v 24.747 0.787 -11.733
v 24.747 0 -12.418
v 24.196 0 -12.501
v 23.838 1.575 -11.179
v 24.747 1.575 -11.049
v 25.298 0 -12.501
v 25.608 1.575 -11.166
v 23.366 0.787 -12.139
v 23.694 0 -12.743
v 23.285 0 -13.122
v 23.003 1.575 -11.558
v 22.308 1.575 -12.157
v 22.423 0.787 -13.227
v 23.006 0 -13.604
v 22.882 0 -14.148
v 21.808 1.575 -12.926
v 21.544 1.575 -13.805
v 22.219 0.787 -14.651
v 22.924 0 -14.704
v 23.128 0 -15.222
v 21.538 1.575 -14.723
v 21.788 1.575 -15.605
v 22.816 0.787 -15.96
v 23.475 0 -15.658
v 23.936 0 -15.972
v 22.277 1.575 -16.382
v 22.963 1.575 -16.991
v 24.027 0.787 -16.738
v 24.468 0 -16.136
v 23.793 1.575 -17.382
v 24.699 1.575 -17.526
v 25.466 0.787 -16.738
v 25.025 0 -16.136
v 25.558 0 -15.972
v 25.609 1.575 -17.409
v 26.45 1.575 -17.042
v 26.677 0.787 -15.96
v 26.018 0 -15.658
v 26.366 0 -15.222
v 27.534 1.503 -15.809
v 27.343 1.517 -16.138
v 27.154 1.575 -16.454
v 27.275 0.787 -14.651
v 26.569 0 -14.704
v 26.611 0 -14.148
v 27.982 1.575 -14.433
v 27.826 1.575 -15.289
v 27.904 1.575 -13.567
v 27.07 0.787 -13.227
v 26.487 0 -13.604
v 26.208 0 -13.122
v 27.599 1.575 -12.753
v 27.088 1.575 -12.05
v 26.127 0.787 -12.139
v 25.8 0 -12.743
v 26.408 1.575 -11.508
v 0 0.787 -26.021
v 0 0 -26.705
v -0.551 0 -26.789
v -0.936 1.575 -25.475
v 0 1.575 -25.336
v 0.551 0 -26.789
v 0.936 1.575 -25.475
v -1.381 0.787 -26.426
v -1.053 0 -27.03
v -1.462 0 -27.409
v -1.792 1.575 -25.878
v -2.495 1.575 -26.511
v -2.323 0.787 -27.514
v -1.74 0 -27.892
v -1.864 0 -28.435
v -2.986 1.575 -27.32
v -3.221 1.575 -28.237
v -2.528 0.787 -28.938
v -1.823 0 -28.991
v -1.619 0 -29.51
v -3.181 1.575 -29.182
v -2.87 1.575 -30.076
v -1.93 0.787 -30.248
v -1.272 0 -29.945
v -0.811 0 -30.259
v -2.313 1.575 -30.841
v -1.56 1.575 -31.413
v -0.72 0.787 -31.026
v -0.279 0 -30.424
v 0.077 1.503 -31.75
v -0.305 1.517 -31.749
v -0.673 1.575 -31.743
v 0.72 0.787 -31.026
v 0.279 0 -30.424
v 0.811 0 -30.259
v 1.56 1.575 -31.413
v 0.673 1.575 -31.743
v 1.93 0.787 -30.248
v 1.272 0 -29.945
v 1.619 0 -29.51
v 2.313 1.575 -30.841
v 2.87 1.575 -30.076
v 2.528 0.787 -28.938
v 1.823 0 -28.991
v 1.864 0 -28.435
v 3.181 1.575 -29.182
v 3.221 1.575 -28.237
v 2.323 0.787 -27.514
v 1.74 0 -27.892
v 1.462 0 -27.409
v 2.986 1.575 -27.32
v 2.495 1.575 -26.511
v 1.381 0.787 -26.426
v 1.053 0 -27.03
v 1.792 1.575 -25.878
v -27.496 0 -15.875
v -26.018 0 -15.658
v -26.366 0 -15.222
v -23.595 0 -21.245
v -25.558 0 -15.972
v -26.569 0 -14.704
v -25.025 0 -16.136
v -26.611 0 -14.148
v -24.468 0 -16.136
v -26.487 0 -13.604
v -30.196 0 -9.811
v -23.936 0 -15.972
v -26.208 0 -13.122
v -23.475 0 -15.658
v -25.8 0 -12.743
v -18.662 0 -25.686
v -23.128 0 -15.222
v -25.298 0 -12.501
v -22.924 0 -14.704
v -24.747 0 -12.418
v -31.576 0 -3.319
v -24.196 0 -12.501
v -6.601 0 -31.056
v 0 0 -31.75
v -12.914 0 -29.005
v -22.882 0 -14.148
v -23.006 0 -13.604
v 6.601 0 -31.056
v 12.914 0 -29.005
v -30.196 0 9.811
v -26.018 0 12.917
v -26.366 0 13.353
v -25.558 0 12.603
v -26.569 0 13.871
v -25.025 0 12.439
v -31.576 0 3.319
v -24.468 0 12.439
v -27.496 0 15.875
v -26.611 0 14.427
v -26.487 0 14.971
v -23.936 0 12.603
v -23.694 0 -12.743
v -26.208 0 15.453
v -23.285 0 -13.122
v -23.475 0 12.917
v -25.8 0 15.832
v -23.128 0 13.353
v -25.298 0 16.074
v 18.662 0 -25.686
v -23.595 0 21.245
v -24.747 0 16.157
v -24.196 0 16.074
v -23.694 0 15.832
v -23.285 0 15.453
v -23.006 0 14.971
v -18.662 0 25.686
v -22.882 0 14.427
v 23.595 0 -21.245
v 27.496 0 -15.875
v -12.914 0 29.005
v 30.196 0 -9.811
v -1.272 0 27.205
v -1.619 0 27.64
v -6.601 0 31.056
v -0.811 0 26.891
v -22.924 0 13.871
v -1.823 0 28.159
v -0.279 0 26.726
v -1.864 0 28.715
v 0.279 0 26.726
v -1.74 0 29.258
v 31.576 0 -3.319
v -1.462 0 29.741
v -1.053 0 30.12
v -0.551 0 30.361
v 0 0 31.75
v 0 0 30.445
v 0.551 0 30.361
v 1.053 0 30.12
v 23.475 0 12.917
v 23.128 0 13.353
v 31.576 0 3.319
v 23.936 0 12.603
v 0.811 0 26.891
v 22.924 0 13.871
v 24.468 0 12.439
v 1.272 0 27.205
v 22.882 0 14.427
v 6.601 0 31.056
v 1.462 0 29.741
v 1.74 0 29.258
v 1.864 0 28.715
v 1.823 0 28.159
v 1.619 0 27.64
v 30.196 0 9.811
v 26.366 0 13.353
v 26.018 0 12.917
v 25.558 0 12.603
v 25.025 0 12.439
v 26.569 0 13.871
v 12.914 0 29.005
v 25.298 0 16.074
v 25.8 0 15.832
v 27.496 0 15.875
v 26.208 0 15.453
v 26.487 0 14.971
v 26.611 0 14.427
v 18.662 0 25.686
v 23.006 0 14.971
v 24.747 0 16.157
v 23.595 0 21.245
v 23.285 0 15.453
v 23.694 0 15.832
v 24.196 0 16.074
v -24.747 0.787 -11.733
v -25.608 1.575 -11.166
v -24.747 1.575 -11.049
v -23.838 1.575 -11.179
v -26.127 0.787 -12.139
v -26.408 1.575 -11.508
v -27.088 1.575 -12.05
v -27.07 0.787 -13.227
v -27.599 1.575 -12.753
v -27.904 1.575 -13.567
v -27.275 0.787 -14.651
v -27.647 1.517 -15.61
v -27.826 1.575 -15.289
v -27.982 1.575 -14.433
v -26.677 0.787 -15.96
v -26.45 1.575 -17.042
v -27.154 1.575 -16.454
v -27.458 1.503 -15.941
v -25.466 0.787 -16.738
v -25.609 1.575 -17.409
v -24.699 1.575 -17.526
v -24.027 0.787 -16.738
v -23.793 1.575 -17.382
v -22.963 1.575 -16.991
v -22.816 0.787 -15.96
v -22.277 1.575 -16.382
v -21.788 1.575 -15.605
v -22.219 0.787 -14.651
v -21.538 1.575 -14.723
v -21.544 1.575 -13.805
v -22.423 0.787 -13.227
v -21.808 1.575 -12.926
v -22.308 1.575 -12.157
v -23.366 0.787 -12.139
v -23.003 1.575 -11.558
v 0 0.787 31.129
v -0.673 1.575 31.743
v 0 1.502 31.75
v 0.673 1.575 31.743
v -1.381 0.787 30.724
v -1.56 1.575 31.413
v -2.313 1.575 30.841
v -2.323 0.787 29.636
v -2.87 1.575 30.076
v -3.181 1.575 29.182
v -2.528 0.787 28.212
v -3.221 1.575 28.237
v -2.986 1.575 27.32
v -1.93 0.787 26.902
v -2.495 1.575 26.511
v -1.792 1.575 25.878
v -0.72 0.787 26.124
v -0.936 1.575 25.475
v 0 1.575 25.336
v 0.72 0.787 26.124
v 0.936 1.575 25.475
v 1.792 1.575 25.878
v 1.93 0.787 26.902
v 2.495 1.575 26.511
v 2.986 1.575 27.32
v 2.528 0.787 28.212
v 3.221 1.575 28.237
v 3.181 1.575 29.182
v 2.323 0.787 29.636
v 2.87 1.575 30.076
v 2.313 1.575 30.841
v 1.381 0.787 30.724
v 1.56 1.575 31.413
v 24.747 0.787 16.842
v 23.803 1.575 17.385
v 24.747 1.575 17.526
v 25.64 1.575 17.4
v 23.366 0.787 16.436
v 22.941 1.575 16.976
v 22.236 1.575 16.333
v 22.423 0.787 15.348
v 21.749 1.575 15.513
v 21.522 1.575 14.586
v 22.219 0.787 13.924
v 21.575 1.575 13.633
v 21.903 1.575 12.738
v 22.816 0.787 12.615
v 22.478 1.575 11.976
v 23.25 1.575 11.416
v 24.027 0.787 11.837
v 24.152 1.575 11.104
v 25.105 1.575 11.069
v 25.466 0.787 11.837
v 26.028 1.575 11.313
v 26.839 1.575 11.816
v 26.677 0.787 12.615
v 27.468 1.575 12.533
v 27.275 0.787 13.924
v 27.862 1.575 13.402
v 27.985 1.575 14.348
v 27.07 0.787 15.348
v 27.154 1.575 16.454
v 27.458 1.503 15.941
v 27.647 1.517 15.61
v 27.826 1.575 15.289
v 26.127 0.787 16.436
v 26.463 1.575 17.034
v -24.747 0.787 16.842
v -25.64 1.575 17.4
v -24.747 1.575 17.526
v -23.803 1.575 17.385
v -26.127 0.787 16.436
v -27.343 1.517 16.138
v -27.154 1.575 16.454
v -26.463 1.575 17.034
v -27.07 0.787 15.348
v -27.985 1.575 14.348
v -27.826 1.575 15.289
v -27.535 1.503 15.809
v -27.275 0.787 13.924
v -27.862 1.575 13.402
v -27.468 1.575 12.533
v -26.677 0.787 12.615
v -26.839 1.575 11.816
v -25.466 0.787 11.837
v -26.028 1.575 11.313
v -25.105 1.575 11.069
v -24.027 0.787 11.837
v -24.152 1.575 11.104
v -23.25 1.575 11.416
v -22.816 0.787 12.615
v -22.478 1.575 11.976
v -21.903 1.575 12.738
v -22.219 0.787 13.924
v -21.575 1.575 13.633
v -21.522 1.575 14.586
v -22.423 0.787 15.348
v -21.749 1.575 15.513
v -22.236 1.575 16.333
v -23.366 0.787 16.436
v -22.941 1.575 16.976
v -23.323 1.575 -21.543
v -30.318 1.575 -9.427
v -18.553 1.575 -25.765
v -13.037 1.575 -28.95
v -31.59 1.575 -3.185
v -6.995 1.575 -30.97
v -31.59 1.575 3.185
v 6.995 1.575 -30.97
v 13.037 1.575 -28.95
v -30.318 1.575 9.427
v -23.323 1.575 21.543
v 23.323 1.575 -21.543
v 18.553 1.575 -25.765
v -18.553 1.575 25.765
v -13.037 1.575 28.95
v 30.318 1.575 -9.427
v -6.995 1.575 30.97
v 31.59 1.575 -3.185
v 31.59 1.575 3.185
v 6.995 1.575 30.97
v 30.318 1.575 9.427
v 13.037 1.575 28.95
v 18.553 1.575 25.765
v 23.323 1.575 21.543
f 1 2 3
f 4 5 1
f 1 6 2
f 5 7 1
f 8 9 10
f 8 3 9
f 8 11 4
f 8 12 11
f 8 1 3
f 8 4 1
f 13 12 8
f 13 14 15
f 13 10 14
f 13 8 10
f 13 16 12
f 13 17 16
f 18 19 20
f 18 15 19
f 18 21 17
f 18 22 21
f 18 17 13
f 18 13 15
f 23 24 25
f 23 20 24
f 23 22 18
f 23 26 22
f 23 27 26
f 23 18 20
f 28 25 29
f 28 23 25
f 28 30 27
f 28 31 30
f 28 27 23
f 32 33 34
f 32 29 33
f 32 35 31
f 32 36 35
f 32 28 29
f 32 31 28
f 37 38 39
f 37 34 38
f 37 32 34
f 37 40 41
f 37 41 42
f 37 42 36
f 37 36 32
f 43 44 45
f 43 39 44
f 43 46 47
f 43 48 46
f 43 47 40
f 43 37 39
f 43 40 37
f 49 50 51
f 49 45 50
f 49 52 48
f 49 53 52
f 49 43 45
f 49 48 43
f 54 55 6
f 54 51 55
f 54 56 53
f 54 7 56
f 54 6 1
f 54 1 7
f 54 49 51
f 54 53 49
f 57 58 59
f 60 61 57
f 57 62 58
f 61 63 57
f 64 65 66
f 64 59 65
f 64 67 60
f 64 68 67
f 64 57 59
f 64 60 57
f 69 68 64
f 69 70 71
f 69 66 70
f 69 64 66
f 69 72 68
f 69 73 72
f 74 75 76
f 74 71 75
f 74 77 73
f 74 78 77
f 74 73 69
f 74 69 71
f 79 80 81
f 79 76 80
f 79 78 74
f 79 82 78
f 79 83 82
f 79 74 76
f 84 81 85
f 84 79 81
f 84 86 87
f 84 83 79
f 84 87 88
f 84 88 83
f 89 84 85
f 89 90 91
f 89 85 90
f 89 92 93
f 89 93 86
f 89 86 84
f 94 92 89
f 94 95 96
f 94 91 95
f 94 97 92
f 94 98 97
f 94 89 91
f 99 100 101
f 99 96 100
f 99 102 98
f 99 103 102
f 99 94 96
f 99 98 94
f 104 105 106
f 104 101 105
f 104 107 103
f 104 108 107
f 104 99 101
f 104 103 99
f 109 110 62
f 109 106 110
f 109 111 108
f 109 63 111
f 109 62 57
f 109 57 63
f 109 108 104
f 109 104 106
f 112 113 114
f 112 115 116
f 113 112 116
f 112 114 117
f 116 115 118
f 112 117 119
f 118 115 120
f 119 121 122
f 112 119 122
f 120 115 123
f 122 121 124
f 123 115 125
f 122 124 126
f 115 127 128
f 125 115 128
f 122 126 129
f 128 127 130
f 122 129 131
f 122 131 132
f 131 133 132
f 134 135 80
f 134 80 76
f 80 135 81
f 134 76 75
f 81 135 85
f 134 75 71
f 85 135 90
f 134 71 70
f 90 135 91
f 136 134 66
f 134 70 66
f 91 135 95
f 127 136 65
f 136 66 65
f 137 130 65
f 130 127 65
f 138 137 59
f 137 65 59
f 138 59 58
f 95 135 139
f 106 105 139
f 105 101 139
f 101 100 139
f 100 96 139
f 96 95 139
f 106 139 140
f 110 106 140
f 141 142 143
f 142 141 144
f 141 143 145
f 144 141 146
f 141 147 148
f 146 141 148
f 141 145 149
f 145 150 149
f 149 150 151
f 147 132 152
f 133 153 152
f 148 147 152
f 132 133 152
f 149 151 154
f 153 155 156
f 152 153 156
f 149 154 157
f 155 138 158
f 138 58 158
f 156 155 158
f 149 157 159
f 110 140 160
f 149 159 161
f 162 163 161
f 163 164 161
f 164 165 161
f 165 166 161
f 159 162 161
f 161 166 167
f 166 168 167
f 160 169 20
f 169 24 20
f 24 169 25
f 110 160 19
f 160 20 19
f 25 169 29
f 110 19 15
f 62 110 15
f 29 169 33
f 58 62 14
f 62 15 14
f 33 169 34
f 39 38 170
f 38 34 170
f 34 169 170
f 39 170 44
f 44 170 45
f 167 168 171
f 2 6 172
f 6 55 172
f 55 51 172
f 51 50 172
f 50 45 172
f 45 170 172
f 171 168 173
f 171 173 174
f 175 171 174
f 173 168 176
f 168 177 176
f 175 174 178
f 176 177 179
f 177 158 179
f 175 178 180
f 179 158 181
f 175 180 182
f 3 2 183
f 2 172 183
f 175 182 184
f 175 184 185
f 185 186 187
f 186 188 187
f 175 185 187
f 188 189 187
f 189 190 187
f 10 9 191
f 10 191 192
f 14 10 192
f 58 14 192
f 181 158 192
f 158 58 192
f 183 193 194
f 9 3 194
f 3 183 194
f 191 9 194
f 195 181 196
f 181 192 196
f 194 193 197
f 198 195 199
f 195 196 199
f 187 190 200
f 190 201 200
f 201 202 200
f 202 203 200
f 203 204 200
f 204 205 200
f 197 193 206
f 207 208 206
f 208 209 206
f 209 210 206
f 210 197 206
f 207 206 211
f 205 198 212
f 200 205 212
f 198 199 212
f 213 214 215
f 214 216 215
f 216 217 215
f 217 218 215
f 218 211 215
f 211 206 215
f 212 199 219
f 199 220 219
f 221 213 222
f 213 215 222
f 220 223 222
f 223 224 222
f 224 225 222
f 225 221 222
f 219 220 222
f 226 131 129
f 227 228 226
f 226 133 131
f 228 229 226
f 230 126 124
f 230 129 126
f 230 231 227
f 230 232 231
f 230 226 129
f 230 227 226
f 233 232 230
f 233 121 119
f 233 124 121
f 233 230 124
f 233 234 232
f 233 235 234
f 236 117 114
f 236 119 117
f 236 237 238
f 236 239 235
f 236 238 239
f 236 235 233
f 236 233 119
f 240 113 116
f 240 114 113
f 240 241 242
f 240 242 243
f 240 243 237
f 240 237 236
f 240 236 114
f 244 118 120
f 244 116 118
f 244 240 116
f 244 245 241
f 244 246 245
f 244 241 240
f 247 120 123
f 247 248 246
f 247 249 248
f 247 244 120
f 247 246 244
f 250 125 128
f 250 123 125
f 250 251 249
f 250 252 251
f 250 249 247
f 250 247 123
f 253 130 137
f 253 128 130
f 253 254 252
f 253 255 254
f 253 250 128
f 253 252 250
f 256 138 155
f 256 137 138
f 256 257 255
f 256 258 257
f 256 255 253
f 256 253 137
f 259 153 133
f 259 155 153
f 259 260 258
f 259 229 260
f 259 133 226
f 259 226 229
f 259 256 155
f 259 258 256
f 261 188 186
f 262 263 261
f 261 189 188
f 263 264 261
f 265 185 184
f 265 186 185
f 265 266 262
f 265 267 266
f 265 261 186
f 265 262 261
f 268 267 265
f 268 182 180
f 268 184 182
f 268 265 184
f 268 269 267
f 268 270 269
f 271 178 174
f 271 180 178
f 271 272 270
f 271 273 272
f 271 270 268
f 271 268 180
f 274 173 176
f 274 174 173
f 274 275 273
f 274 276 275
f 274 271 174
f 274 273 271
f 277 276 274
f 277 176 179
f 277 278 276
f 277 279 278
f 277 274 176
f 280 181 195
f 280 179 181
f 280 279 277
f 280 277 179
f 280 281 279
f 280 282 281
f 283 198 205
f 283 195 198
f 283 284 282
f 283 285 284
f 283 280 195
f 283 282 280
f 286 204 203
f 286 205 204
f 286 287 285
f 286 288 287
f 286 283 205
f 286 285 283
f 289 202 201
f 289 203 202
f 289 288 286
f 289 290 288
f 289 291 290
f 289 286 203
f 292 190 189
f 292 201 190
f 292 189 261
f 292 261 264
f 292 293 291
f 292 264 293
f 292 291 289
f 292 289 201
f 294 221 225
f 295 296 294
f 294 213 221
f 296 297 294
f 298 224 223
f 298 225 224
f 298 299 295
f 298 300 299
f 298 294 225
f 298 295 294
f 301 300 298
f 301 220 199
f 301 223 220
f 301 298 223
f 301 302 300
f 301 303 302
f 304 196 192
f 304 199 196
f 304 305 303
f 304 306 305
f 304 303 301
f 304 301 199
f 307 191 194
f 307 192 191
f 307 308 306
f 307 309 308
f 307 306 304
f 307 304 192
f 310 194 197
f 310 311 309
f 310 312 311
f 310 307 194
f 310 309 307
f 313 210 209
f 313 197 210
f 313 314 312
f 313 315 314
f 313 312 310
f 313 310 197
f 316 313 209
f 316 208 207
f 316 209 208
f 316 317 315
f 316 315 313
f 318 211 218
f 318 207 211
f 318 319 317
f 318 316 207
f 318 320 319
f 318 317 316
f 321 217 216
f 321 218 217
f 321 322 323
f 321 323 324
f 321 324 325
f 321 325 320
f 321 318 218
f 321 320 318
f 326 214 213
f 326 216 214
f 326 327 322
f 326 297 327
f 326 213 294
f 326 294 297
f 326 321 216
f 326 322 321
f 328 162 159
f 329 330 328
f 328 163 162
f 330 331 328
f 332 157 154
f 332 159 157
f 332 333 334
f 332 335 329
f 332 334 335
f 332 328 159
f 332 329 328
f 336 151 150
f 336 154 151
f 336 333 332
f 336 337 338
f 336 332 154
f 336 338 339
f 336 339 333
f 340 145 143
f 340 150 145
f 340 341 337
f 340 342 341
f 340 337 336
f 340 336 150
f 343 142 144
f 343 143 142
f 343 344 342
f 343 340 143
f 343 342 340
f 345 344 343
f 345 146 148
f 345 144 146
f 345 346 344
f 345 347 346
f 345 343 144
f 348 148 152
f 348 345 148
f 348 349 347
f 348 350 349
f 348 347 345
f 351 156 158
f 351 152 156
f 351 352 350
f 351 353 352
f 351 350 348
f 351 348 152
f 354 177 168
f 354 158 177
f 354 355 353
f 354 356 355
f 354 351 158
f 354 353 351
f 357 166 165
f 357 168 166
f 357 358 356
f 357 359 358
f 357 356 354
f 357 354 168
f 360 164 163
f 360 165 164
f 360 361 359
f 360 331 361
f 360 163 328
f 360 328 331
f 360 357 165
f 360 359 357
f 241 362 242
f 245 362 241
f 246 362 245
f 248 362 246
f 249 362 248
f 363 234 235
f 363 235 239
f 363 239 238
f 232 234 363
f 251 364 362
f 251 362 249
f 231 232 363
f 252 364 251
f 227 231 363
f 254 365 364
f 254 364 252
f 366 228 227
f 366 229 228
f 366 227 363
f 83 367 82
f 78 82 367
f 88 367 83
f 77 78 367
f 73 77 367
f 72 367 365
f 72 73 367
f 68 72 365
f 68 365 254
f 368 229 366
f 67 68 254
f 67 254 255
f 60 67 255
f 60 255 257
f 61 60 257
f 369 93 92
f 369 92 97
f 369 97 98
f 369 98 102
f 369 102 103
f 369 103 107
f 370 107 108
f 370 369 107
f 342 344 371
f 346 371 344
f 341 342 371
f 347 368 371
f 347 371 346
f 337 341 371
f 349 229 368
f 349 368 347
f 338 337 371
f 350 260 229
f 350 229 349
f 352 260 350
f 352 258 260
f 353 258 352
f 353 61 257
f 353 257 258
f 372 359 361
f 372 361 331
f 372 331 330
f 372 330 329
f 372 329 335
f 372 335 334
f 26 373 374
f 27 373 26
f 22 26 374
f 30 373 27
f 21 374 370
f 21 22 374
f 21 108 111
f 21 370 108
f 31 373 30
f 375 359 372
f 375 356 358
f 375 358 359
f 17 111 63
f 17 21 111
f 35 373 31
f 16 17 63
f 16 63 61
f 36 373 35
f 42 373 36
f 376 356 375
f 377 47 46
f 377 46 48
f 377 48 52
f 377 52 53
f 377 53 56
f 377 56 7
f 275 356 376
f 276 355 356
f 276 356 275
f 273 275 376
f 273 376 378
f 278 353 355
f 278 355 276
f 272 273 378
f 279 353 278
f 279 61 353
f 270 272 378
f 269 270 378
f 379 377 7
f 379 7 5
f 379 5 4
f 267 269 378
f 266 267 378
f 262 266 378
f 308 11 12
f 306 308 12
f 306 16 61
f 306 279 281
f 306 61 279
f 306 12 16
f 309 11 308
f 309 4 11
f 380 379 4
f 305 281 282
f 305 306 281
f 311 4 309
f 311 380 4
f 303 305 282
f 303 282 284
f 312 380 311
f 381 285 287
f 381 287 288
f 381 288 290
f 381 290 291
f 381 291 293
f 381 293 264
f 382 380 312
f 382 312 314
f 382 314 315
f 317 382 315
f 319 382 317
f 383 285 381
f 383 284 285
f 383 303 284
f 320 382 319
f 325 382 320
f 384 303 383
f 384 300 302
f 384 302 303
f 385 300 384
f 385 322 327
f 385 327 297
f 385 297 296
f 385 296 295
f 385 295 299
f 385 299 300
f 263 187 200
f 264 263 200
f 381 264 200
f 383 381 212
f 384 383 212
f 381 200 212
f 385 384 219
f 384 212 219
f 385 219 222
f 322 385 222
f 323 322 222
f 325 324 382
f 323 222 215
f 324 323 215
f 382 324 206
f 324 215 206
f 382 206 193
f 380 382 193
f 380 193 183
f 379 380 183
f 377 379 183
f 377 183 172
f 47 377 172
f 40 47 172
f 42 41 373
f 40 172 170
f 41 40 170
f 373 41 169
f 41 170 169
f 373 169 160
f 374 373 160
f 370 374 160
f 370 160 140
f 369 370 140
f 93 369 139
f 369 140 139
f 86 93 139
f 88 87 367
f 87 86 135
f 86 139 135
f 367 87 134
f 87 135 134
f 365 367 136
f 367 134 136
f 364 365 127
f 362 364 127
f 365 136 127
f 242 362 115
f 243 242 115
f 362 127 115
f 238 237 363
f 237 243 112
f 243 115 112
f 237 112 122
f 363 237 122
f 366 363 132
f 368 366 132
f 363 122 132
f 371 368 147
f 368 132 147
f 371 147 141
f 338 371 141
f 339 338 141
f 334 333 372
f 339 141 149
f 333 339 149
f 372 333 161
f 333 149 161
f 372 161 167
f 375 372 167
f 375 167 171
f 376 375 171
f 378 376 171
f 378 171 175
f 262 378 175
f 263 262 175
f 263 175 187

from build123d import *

# Parameters (mm, degrees)
SKETCH1_R                                     = 31.75
BOSS_EXTRUDE1_DEPTH                           = 1.5748
CSK_FOR_4_FLAT_HEAD_SOCKET_CAP_SCREW1_A_COUNT = 2
CSK_FOR_4_FLAT_HEAD_SOCKET_CAP_SCREW1_A_PITCH = 28.575
CSK_FOR_4_FLAT_HEAD_SOCKET_CAP_SCRE_2_COUNT   = 2
CSK_FOR_4_FLAT_HEAD_SOCKET_CAP_SCRE_2_PITCH   = 49.493351826
CSK_FOR_4_FLAT_HEAD_SOCKET_CAP_SCRE_3_COUNT   = 2
CSK_FOR_4_FLAT_HEAD_SOCKET_CAP_SCRE_3_PITCH   = 57.15
CSK_FOR_4_FLAT_HEAD_SOCKET_CAP_SCRE_4_COUNT   = 2
CSK_FOR_4_FLAT_HEAD_SOCKET_CAP_SCRE_4_PITCH   = 49.493351826
CSK_FOR_4_FLAT_HEAD_SOCKET_CAP_SCRE_5_COUNT   = 2
CSK_FOR_4_FLAT_HEAD_SOCKET_CAP_SCRE_5_PITCH   = 28.575


with BuildPart() as part:
    # Sketch1 → Boss-Extrude1 (new body)
    with BuildSketch(Plane(origin=(0, 0, 0), x_dir=(1, 0, 0), z_dir=(0, 1, 0))):
        with Locations(Location((0, 0, 0), (0, 0, 270))):
            Circle(SKETCH1_R)
    extrude(amount=BOSS_EXTRUDE1_DEPTH)

    # Sketch2 → CSK for #4 Flat Head Socket Cap Screw1 (revolve, cut)
    with BuildSketch(Plane(origin=(0, 1.5748, 28.575), x_dir=(0, 0, 1), z_dir=(1, 0, 0))):
        Polygon((0, 0), (0, 1.5748), (1.63195, 1.5748), (1.63195, 1.848124365), (3.2385, 0), align=None)
    csk_for_4_flat_head_socket_cap_screw1 = revolve(axis=Axis((0, 7.9248, 28.575), (0, -1, 0)), mode=Mode.SUBTRACT)

    # CSK for #4 Flat Head Socket Cap Screw1 a: CSK for #4 Flat Head Socket Cap Screw1 ×2
    with Locations(*[Vector(-0.8660254037844382, 0, -0.5000000000000009) * (i * CSK_FOR_4_FLAT_HEAD_SOCKET_CAP_SCREW1_A_PITCH) for i in range(1, CSK_FOR_4_FLAT_HEAD_SOCKET_CAP_SCREW1_A_COUNT)]):
        add(csk_for_4_flat_head_socket_cap_screw1, mode=Mode.SUBTRACT)

    # CSK for _4 Flat Head Socket Cap Scre 2: CSK for #4 Flat Head Socket Cap Screw1 ×2
    with Locations(*[Vector(-0.5000000000000123, 0, -0.8660254037844316) * (i * CSK_FOR_4_FLAT_HEAD_SOCKET_CAP_SCRE_2_PITCH) for i in range(1, CSK_FOR_4_FLAT_HEAD_SOCKET_CAP_SCRE_2_COUNT)]):
        add(csk_for_4_flat_head_socket_cap_screw1, mode=Mode.SUBTRACT)

    # CSK for _4 Flat Head Socket Cap Scre 3: CSK for #4 Flat Head Socket Cap Screw1 ×2
    with Locations(*[(0, 0, -i * CSK_FOR_4_FLAT_HEAD_SOCKET_CAP_SCRE_3_PITCH) for i in range(1, CSK_FOR_4_FLAT_HEAD_SOCKET_CAP_SCRE_3_COUNT)]):
        add(csk_for_4_flat_head_socket_cap_screw1, mode=Mode.SUBTRACT)

    # CSK for _4 Flat Head Socket Cap Scre 4: CSK for #4 Flat Head Socket Cap Screw1 ×2
    with Locations(*[Vector(0.4999999999999877, 0, -0.8660254037844458) * (i * CSK_FOR_4_FLAT_HEAD_SOCKET_CAP_SCRE_4_PITCH) for i in range(1, CSK_FOR_4_FLAT_HEAD_SOCKET_CAP_SCRE_4_COUNT)]):
        add(csk_for_4_flat_head_socket_cap_screw1, mode=Mode.SUBTRACT)

    # CSK for _4 Flat Head Socket Cap Scre 5: CSK for #4 Flat Head Socket Cap Screw1 ×2
    with Locations(*[Vector(0.8660254037844416, 0, -0.499999999999995) * (i * CSK_FOR_4_FLAT_HEAD_SOCKET_CAP_SCRE_5_PITCH) for i in range(1, CSK_FOR_4_FLAT_HEAD_SOCKET_CAP_SCRE_5_COUNT)]):
        add(csk_for_4_flat_head_socket_cap_screw1, mode=Mode.SUBTRACT)


solid = part.part
